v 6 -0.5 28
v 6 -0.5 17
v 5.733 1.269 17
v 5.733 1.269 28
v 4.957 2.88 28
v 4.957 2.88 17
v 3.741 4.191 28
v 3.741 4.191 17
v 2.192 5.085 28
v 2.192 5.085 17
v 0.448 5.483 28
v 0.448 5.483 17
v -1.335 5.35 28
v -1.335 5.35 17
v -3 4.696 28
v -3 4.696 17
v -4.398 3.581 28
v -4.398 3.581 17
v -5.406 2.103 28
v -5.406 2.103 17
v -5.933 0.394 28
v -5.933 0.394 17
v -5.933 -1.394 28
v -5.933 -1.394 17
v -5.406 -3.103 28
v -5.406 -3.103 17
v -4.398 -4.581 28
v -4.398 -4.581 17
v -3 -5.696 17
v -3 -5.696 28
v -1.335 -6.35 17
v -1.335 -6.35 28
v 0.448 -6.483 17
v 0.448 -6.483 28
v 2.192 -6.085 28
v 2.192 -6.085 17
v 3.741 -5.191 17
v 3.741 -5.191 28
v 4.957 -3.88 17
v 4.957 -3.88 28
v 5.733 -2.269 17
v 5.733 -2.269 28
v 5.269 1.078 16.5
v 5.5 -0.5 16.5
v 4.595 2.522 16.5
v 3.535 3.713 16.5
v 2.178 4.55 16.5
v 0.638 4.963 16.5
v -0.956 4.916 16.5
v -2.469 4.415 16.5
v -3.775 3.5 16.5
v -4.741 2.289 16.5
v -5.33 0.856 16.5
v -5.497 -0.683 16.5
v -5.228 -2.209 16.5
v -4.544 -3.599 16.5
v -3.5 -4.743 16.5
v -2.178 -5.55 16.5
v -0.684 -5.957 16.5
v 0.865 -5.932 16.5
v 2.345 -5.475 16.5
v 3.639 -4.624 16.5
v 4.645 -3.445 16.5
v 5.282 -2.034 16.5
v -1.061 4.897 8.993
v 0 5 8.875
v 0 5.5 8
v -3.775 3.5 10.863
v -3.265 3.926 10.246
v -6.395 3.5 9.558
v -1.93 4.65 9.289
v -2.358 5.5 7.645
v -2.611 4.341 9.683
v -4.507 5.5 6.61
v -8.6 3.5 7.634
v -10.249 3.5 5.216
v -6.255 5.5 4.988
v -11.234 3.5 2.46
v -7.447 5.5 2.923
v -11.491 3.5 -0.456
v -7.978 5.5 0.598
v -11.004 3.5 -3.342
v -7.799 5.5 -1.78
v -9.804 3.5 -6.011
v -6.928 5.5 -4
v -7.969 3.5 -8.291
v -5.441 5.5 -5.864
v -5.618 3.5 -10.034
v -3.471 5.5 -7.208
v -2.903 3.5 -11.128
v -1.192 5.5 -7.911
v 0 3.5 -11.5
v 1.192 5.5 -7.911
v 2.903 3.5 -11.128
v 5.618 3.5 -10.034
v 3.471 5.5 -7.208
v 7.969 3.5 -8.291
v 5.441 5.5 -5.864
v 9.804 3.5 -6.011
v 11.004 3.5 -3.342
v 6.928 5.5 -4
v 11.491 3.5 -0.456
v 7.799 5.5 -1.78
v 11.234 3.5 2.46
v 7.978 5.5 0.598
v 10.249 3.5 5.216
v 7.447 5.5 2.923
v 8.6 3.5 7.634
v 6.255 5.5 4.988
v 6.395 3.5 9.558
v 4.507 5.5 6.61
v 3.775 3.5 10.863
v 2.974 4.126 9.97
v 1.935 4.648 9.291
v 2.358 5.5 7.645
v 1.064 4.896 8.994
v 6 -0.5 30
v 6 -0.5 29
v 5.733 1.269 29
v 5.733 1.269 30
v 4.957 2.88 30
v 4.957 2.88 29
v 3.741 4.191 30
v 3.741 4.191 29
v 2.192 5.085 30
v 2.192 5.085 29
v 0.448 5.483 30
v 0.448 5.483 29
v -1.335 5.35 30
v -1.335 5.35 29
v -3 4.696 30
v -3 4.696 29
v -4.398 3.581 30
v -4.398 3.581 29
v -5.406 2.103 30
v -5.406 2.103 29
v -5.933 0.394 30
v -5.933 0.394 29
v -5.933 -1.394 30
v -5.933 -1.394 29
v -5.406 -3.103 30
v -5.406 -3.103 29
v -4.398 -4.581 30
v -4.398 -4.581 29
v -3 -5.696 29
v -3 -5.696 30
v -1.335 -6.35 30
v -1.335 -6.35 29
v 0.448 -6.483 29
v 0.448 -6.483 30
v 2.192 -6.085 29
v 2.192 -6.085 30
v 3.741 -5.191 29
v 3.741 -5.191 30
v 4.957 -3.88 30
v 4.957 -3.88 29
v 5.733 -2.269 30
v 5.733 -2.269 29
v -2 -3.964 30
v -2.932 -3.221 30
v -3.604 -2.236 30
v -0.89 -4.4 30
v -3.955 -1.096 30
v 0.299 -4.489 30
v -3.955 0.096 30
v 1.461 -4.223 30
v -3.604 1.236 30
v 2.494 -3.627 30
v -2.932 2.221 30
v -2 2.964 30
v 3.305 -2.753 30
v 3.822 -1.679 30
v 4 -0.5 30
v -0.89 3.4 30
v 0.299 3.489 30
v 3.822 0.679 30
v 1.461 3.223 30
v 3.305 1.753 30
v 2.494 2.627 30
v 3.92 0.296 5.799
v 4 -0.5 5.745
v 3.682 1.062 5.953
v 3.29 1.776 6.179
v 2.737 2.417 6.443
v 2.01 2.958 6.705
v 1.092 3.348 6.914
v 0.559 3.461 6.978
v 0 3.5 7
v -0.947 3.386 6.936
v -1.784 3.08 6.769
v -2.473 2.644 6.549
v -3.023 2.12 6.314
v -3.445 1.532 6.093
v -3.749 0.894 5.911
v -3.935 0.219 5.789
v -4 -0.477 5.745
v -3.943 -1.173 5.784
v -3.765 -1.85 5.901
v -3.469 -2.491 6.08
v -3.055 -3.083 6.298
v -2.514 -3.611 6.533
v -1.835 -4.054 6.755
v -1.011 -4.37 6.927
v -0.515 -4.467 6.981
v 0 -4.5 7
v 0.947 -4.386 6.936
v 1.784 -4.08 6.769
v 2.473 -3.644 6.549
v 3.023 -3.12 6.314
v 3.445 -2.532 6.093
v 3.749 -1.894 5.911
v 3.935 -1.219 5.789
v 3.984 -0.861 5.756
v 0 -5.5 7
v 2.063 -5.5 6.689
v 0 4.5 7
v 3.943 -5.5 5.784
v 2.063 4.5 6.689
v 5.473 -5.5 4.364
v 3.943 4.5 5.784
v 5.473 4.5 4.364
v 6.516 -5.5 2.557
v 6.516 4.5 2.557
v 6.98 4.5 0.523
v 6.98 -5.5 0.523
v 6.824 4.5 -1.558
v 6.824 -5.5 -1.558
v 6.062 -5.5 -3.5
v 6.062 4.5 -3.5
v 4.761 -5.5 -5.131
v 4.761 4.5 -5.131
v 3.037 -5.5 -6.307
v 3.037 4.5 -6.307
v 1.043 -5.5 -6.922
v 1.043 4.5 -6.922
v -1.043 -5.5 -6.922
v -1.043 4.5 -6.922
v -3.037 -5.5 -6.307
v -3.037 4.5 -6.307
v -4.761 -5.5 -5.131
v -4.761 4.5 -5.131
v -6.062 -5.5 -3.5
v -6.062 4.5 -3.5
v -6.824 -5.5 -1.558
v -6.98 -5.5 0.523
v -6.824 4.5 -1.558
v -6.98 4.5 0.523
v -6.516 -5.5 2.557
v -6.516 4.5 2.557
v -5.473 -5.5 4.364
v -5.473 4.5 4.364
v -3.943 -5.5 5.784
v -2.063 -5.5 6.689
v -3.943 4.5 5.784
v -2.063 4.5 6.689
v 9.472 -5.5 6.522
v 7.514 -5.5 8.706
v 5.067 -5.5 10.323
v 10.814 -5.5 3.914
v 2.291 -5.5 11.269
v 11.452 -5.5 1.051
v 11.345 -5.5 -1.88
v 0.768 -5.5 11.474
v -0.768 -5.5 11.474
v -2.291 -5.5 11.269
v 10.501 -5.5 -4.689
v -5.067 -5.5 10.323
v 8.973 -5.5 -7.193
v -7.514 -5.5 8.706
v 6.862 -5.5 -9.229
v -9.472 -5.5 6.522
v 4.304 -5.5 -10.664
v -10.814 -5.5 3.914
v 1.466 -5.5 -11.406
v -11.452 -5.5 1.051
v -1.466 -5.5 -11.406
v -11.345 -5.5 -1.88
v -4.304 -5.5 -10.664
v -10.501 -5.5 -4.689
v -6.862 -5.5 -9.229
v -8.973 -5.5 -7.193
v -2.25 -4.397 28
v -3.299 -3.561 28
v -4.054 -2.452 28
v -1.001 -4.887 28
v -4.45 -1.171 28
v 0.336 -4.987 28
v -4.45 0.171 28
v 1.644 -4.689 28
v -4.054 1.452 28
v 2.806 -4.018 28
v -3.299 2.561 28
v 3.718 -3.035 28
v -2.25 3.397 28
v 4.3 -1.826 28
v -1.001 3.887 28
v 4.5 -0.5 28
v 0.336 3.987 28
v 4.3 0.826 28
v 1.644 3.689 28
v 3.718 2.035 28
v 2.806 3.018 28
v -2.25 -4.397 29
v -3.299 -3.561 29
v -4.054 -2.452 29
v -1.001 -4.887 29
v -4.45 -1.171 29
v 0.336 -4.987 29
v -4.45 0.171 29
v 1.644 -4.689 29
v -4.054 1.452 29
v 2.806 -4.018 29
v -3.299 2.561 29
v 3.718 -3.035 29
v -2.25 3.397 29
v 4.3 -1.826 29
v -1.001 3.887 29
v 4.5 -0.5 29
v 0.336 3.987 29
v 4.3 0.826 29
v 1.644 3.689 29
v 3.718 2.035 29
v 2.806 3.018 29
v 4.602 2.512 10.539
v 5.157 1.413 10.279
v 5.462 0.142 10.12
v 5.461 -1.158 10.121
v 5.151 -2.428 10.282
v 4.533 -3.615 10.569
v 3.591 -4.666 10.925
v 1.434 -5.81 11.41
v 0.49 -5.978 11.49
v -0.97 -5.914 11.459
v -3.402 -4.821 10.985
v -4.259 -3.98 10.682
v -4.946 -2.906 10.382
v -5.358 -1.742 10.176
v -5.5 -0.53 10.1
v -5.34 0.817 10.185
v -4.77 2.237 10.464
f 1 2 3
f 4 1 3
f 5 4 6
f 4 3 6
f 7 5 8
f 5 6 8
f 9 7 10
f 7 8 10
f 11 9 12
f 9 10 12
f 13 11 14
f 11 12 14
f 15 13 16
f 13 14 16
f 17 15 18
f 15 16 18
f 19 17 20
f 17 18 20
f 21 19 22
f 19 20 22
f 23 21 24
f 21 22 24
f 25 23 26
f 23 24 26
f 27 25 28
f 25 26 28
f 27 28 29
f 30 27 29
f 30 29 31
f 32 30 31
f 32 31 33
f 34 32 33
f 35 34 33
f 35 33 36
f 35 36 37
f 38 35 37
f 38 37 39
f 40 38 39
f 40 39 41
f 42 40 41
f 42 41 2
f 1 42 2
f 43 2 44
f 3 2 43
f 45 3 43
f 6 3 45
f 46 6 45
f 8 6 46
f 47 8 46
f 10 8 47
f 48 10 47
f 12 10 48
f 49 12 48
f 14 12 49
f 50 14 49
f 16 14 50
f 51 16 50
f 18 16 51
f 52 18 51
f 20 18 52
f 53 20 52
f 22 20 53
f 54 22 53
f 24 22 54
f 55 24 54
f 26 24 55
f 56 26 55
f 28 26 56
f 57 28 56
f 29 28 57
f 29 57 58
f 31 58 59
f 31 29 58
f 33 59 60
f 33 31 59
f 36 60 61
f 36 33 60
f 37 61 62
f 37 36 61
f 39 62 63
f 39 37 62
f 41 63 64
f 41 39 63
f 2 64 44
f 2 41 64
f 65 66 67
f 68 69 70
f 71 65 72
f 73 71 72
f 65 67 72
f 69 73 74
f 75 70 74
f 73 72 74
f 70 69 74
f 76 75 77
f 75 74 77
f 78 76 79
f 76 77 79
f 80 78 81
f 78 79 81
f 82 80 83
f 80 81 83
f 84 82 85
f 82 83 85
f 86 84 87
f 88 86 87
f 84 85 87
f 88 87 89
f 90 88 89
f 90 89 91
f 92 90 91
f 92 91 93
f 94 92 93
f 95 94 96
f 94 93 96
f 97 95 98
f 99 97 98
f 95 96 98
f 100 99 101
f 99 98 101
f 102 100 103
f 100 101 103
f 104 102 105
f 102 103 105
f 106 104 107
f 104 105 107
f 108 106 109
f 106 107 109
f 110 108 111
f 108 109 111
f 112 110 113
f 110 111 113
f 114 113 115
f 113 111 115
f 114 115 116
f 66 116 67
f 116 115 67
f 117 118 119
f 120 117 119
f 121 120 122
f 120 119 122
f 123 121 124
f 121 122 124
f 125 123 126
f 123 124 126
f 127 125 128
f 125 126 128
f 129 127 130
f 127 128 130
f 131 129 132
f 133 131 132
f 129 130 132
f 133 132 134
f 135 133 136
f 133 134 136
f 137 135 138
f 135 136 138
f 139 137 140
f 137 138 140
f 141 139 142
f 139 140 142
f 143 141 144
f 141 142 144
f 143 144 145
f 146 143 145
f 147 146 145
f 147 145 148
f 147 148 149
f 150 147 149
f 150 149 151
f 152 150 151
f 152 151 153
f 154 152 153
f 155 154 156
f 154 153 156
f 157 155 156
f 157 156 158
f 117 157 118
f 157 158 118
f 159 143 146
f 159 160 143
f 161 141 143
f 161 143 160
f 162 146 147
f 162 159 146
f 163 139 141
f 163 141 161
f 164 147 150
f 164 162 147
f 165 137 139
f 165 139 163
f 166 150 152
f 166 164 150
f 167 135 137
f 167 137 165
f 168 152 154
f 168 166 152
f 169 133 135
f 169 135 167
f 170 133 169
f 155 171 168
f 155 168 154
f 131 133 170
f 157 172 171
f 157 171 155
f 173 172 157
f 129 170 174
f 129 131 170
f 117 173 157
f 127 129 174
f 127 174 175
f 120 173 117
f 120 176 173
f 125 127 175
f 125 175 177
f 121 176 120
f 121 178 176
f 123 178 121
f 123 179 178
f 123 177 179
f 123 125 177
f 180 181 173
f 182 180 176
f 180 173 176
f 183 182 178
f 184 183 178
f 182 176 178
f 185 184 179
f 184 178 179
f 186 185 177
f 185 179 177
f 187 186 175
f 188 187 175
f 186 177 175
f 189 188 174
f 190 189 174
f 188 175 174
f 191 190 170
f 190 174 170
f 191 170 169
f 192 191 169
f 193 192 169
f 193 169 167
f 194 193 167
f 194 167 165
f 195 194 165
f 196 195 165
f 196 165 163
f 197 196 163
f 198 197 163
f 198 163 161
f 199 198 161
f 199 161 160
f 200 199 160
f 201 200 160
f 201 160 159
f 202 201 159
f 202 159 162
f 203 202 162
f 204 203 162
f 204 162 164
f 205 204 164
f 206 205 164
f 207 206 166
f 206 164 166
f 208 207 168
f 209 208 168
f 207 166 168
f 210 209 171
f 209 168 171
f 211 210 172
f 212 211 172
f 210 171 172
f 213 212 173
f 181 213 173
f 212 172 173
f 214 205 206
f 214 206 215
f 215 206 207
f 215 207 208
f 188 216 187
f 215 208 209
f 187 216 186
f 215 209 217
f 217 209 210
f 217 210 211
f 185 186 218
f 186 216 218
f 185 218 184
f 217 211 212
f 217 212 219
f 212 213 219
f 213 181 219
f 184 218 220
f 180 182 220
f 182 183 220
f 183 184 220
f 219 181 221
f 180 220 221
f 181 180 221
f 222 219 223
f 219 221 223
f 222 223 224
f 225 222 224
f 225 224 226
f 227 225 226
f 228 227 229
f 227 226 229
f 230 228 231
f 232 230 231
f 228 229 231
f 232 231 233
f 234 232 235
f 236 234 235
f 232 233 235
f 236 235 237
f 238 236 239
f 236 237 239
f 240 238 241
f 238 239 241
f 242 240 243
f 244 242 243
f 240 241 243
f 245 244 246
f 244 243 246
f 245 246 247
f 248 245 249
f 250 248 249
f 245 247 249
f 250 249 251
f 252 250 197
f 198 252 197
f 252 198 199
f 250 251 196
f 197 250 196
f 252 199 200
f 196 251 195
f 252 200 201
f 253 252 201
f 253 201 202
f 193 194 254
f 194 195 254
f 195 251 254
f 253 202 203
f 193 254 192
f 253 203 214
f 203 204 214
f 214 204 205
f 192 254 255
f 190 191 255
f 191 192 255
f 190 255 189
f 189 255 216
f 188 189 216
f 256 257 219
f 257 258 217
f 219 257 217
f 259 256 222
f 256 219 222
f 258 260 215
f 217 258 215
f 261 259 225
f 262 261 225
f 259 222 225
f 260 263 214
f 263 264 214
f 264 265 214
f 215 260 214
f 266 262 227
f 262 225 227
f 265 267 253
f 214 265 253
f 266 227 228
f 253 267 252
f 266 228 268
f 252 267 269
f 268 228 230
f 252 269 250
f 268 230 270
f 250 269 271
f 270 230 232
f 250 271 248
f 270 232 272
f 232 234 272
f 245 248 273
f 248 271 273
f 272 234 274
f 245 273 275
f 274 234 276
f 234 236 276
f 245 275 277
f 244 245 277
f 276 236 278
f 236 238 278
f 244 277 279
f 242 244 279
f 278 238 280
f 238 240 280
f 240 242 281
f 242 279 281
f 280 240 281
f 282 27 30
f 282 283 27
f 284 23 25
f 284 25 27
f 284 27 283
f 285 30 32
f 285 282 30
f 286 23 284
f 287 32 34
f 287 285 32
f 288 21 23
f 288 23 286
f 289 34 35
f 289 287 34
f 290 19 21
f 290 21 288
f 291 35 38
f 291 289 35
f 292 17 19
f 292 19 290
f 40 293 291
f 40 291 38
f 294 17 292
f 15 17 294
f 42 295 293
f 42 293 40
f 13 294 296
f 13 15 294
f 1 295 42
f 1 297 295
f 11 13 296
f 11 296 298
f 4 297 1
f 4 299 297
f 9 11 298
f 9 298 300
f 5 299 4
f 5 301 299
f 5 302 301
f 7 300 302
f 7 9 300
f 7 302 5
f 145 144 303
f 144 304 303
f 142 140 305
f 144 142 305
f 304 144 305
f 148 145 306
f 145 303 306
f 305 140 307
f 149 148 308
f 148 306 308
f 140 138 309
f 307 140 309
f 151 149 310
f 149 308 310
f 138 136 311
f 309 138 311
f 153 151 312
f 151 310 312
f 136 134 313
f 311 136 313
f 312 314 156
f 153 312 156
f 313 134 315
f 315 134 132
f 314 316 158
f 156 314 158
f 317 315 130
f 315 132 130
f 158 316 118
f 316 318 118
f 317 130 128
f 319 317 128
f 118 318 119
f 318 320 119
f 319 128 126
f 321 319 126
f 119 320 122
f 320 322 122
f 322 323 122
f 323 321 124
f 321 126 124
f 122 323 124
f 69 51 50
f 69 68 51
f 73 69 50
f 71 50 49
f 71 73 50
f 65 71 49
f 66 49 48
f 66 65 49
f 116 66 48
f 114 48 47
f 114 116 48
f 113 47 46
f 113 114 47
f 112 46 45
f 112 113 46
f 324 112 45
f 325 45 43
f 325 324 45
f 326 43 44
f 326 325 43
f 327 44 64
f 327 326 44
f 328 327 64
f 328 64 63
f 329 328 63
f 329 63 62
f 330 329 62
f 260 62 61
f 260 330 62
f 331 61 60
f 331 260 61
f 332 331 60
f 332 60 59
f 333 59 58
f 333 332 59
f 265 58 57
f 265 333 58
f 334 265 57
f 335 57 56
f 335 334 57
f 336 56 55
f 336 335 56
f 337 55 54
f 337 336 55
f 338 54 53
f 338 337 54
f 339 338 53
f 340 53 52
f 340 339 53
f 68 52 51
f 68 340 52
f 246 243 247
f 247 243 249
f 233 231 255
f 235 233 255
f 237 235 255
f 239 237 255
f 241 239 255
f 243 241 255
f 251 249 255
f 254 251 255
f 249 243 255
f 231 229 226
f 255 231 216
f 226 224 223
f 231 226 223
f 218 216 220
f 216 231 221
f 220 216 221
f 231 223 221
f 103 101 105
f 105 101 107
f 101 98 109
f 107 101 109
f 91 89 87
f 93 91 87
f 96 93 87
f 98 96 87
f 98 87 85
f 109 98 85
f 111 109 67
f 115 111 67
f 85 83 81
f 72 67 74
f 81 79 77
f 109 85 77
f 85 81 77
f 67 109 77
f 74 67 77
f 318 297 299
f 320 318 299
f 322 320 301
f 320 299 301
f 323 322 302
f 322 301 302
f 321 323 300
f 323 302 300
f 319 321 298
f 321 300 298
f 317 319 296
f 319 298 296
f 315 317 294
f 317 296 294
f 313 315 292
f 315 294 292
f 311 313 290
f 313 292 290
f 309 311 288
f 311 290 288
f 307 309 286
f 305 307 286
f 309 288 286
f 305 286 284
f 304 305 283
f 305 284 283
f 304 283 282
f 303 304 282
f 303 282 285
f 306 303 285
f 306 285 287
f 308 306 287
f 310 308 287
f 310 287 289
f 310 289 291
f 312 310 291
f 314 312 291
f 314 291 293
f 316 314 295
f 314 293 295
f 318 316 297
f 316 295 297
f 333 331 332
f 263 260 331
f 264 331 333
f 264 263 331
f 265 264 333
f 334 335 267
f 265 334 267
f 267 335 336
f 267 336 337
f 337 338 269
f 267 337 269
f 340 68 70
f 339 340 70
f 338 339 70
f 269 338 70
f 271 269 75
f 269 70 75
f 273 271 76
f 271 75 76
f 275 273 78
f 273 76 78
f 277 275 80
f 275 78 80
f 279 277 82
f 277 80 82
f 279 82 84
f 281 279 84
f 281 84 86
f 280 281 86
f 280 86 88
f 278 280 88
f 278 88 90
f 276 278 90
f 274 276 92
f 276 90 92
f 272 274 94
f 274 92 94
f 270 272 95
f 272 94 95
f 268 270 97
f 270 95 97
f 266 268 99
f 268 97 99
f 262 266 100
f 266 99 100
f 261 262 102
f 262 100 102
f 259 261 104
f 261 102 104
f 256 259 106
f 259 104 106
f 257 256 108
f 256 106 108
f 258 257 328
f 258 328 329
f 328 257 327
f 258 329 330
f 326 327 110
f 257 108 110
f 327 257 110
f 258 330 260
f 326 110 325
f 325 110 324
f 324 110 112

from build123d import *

# Parameters (mm, degrees)
SKETCH2_R           = 5.5
BOSS_EXTRUDE4_DEPTH = 30
CUT_EXTRUDE1_START  = -2
SKETCH3_R           = 5.5
SKETCH3_R_2         = 4.5
CUT_EXTRUDE1_DEPTH  = 1
SKETCH5_R           = 11.5
CUT_EXTRUDE3_DEPTH  = 6
SKETCH8_R           = 4
CUT_EXTRUDE4_DEPTH  = 34
CUT_EXTRUDE6_START  = -1
SKETCH9_R           = 7
CUT_EXTRUDE6_DEPTH  = 34
BOSS_EXTRUDE5_START = -1
SKETCH10_R          = 6
SKETCH10_R_2        = 5.5
BOSS_EXTRUDE5_DEPTH = 1
BOSS_EXTRUDE6_START = -12
SKETCH11_R          = 6
SKETCH11_R_2        = 5.5
BOSS_EXTRUDE6_DEPTH = 12
CHAMFER1_SIZE       = 1


with BuildPart() as part:
    # Sketch1 → Revolve2 (revolve)
    with BuildSketch(Plane.XY, mode=Mode.PRIVATE) as revolve2_sk:
        Polygon((11.5, 3.5), (8, 5.5), (0, 5.5), (0, -5.5), (11.5, -5.5), align=None)
    revolve(revolve2_sk.sketch.rotate(Axis((0, 5.5, 0), (0, -1, 0)), 90), axis=Axis((0, 5.5, 0), (0, -1, 0)))

    # Sketch2 → Boss-Extrude4 (add)
    with BuildSketch(Plane.XY):
        with Locations(Location((0, -0.5, 0), (0, 0, 133.341758512))):
            Circle(SKETCH2_R)
    extrude(amount=BOSS_EXTRUDE4_DEPTH)

    # Sketch3 → Cut-Extrude1 (cut)
    with BuildSketch(Plane.XY.offset(30).offset(CUT_EXTRUDE1_START)):
        with Locations(Location((0, -0.5, 0), (0, 0, 133.341758512))):
            Circle(SKETCH3_R)
        with Locations((0, -0.5)):
            Circle(SKETCH3_R_2, mode=Mode.SUBTRACT)
    extrude(amount=CUT_EXTRUDE1_DEPTH, mode=Mode.SUBTRACT)

    # Sketch5 → Cut-Extrude3 (cut)
    with BuildSketch(Plane.XZ.offset(5.5)):
        Circle(SKETCH5_R)
    extrude(amount=CUT_EXTRUDE3_DEPTH, mode=Mode.SUBTRACT)

    # Sketch8 → Cut-Extrude4 (cut)
    with BuildSketch(Plane.XY.offset(30)):
        with Locations((0, -0.5)):
            Circle(SKETCH8_R)
    extrude(amount=-CUT_EXTRUDE4_DEPTH, mode=Mode.SUBTRACT)

    # Sketch9 → Cut-Extrude6 (cut)
    with BuildSketch(Plane(origin=(0, 5.5, 0), x_dir=(1, 0, 0), z_dir=(0, 1, 0)).offset(CUT_EXTRUDE6_START)):
        with Locations(Location((0, 0, 0), (0, 0, 270))):
            Circle(SKETCH9_R)
    extrude(amount=-CUT_EXTRUDE6_DEPTH, mode=Mode.SUBTRACT)

    # Sketch10 → Boss-Extrude5 (add)
    with BuildSketch(Plane.XY.offset(30).offset(BOSS_EXTRUDE5_START)):
        with Locations((0, -0.5)):
            Circle(SKETCH10_R)
        with Locations(Location((0, -0.5, 0), (0, 0, 133.341758512))):
            Circle(SKETCH10_R_2, mode=Mode.SUBTRACT)
    extrude(amount=BOSS_EXTRUDE5_DEPTH)

    # Sketch11 → Boss-Extrude6 (add)
    with BuildSketch(Plane.XY.offset(28).offset(BOSS_EXTRUDE6_START)):
        with Locations((0, -0.5)):
            Circle(SKETCH11_R)
        with Locations(Location((0, -0.5, 0), (0, 0, 133.341758512))):
            Circle(SKETCH11_R_2, mode=Mode.SUBTRACT)
    extrude(amount=BOSS_EXTRUDE6_DEPTH)

    # Chamfer1
    # the kernel refuses this chamfer: 1 mm, written as the material it takes off along each edge
    with BuildSketch(Plane(origin=(0, -0.5, 16), x_dir=(1, 0, 0), z_dir=(0, -1, 0))) as chamfer1_piece_1_section:
        Polygon((6 - CHAMFER1_SIZE, 0), (6, CHAMFER1_SIZE), (6, 0), align=None)
    chamfer1_piece_1 = revolve(axis=Axis((0, -0.5, 16), (0, 0, 1)), mode=Mode.PRIVATE)
    chamfer1_piece_1 = chamfer1_piece_1 - Plane(origin=(0, -0.5, 16.746748463), x_dir=(-0.6863485886393825, 0.7272727238613639, 0), z_dir=(0, 0, -1)) * Cylinder(5.5, 25, mode=Mode.PRIVATE)
    add(chamfer1_piece_1, mode=Mode.SUBTRACT)


solid = part.part
